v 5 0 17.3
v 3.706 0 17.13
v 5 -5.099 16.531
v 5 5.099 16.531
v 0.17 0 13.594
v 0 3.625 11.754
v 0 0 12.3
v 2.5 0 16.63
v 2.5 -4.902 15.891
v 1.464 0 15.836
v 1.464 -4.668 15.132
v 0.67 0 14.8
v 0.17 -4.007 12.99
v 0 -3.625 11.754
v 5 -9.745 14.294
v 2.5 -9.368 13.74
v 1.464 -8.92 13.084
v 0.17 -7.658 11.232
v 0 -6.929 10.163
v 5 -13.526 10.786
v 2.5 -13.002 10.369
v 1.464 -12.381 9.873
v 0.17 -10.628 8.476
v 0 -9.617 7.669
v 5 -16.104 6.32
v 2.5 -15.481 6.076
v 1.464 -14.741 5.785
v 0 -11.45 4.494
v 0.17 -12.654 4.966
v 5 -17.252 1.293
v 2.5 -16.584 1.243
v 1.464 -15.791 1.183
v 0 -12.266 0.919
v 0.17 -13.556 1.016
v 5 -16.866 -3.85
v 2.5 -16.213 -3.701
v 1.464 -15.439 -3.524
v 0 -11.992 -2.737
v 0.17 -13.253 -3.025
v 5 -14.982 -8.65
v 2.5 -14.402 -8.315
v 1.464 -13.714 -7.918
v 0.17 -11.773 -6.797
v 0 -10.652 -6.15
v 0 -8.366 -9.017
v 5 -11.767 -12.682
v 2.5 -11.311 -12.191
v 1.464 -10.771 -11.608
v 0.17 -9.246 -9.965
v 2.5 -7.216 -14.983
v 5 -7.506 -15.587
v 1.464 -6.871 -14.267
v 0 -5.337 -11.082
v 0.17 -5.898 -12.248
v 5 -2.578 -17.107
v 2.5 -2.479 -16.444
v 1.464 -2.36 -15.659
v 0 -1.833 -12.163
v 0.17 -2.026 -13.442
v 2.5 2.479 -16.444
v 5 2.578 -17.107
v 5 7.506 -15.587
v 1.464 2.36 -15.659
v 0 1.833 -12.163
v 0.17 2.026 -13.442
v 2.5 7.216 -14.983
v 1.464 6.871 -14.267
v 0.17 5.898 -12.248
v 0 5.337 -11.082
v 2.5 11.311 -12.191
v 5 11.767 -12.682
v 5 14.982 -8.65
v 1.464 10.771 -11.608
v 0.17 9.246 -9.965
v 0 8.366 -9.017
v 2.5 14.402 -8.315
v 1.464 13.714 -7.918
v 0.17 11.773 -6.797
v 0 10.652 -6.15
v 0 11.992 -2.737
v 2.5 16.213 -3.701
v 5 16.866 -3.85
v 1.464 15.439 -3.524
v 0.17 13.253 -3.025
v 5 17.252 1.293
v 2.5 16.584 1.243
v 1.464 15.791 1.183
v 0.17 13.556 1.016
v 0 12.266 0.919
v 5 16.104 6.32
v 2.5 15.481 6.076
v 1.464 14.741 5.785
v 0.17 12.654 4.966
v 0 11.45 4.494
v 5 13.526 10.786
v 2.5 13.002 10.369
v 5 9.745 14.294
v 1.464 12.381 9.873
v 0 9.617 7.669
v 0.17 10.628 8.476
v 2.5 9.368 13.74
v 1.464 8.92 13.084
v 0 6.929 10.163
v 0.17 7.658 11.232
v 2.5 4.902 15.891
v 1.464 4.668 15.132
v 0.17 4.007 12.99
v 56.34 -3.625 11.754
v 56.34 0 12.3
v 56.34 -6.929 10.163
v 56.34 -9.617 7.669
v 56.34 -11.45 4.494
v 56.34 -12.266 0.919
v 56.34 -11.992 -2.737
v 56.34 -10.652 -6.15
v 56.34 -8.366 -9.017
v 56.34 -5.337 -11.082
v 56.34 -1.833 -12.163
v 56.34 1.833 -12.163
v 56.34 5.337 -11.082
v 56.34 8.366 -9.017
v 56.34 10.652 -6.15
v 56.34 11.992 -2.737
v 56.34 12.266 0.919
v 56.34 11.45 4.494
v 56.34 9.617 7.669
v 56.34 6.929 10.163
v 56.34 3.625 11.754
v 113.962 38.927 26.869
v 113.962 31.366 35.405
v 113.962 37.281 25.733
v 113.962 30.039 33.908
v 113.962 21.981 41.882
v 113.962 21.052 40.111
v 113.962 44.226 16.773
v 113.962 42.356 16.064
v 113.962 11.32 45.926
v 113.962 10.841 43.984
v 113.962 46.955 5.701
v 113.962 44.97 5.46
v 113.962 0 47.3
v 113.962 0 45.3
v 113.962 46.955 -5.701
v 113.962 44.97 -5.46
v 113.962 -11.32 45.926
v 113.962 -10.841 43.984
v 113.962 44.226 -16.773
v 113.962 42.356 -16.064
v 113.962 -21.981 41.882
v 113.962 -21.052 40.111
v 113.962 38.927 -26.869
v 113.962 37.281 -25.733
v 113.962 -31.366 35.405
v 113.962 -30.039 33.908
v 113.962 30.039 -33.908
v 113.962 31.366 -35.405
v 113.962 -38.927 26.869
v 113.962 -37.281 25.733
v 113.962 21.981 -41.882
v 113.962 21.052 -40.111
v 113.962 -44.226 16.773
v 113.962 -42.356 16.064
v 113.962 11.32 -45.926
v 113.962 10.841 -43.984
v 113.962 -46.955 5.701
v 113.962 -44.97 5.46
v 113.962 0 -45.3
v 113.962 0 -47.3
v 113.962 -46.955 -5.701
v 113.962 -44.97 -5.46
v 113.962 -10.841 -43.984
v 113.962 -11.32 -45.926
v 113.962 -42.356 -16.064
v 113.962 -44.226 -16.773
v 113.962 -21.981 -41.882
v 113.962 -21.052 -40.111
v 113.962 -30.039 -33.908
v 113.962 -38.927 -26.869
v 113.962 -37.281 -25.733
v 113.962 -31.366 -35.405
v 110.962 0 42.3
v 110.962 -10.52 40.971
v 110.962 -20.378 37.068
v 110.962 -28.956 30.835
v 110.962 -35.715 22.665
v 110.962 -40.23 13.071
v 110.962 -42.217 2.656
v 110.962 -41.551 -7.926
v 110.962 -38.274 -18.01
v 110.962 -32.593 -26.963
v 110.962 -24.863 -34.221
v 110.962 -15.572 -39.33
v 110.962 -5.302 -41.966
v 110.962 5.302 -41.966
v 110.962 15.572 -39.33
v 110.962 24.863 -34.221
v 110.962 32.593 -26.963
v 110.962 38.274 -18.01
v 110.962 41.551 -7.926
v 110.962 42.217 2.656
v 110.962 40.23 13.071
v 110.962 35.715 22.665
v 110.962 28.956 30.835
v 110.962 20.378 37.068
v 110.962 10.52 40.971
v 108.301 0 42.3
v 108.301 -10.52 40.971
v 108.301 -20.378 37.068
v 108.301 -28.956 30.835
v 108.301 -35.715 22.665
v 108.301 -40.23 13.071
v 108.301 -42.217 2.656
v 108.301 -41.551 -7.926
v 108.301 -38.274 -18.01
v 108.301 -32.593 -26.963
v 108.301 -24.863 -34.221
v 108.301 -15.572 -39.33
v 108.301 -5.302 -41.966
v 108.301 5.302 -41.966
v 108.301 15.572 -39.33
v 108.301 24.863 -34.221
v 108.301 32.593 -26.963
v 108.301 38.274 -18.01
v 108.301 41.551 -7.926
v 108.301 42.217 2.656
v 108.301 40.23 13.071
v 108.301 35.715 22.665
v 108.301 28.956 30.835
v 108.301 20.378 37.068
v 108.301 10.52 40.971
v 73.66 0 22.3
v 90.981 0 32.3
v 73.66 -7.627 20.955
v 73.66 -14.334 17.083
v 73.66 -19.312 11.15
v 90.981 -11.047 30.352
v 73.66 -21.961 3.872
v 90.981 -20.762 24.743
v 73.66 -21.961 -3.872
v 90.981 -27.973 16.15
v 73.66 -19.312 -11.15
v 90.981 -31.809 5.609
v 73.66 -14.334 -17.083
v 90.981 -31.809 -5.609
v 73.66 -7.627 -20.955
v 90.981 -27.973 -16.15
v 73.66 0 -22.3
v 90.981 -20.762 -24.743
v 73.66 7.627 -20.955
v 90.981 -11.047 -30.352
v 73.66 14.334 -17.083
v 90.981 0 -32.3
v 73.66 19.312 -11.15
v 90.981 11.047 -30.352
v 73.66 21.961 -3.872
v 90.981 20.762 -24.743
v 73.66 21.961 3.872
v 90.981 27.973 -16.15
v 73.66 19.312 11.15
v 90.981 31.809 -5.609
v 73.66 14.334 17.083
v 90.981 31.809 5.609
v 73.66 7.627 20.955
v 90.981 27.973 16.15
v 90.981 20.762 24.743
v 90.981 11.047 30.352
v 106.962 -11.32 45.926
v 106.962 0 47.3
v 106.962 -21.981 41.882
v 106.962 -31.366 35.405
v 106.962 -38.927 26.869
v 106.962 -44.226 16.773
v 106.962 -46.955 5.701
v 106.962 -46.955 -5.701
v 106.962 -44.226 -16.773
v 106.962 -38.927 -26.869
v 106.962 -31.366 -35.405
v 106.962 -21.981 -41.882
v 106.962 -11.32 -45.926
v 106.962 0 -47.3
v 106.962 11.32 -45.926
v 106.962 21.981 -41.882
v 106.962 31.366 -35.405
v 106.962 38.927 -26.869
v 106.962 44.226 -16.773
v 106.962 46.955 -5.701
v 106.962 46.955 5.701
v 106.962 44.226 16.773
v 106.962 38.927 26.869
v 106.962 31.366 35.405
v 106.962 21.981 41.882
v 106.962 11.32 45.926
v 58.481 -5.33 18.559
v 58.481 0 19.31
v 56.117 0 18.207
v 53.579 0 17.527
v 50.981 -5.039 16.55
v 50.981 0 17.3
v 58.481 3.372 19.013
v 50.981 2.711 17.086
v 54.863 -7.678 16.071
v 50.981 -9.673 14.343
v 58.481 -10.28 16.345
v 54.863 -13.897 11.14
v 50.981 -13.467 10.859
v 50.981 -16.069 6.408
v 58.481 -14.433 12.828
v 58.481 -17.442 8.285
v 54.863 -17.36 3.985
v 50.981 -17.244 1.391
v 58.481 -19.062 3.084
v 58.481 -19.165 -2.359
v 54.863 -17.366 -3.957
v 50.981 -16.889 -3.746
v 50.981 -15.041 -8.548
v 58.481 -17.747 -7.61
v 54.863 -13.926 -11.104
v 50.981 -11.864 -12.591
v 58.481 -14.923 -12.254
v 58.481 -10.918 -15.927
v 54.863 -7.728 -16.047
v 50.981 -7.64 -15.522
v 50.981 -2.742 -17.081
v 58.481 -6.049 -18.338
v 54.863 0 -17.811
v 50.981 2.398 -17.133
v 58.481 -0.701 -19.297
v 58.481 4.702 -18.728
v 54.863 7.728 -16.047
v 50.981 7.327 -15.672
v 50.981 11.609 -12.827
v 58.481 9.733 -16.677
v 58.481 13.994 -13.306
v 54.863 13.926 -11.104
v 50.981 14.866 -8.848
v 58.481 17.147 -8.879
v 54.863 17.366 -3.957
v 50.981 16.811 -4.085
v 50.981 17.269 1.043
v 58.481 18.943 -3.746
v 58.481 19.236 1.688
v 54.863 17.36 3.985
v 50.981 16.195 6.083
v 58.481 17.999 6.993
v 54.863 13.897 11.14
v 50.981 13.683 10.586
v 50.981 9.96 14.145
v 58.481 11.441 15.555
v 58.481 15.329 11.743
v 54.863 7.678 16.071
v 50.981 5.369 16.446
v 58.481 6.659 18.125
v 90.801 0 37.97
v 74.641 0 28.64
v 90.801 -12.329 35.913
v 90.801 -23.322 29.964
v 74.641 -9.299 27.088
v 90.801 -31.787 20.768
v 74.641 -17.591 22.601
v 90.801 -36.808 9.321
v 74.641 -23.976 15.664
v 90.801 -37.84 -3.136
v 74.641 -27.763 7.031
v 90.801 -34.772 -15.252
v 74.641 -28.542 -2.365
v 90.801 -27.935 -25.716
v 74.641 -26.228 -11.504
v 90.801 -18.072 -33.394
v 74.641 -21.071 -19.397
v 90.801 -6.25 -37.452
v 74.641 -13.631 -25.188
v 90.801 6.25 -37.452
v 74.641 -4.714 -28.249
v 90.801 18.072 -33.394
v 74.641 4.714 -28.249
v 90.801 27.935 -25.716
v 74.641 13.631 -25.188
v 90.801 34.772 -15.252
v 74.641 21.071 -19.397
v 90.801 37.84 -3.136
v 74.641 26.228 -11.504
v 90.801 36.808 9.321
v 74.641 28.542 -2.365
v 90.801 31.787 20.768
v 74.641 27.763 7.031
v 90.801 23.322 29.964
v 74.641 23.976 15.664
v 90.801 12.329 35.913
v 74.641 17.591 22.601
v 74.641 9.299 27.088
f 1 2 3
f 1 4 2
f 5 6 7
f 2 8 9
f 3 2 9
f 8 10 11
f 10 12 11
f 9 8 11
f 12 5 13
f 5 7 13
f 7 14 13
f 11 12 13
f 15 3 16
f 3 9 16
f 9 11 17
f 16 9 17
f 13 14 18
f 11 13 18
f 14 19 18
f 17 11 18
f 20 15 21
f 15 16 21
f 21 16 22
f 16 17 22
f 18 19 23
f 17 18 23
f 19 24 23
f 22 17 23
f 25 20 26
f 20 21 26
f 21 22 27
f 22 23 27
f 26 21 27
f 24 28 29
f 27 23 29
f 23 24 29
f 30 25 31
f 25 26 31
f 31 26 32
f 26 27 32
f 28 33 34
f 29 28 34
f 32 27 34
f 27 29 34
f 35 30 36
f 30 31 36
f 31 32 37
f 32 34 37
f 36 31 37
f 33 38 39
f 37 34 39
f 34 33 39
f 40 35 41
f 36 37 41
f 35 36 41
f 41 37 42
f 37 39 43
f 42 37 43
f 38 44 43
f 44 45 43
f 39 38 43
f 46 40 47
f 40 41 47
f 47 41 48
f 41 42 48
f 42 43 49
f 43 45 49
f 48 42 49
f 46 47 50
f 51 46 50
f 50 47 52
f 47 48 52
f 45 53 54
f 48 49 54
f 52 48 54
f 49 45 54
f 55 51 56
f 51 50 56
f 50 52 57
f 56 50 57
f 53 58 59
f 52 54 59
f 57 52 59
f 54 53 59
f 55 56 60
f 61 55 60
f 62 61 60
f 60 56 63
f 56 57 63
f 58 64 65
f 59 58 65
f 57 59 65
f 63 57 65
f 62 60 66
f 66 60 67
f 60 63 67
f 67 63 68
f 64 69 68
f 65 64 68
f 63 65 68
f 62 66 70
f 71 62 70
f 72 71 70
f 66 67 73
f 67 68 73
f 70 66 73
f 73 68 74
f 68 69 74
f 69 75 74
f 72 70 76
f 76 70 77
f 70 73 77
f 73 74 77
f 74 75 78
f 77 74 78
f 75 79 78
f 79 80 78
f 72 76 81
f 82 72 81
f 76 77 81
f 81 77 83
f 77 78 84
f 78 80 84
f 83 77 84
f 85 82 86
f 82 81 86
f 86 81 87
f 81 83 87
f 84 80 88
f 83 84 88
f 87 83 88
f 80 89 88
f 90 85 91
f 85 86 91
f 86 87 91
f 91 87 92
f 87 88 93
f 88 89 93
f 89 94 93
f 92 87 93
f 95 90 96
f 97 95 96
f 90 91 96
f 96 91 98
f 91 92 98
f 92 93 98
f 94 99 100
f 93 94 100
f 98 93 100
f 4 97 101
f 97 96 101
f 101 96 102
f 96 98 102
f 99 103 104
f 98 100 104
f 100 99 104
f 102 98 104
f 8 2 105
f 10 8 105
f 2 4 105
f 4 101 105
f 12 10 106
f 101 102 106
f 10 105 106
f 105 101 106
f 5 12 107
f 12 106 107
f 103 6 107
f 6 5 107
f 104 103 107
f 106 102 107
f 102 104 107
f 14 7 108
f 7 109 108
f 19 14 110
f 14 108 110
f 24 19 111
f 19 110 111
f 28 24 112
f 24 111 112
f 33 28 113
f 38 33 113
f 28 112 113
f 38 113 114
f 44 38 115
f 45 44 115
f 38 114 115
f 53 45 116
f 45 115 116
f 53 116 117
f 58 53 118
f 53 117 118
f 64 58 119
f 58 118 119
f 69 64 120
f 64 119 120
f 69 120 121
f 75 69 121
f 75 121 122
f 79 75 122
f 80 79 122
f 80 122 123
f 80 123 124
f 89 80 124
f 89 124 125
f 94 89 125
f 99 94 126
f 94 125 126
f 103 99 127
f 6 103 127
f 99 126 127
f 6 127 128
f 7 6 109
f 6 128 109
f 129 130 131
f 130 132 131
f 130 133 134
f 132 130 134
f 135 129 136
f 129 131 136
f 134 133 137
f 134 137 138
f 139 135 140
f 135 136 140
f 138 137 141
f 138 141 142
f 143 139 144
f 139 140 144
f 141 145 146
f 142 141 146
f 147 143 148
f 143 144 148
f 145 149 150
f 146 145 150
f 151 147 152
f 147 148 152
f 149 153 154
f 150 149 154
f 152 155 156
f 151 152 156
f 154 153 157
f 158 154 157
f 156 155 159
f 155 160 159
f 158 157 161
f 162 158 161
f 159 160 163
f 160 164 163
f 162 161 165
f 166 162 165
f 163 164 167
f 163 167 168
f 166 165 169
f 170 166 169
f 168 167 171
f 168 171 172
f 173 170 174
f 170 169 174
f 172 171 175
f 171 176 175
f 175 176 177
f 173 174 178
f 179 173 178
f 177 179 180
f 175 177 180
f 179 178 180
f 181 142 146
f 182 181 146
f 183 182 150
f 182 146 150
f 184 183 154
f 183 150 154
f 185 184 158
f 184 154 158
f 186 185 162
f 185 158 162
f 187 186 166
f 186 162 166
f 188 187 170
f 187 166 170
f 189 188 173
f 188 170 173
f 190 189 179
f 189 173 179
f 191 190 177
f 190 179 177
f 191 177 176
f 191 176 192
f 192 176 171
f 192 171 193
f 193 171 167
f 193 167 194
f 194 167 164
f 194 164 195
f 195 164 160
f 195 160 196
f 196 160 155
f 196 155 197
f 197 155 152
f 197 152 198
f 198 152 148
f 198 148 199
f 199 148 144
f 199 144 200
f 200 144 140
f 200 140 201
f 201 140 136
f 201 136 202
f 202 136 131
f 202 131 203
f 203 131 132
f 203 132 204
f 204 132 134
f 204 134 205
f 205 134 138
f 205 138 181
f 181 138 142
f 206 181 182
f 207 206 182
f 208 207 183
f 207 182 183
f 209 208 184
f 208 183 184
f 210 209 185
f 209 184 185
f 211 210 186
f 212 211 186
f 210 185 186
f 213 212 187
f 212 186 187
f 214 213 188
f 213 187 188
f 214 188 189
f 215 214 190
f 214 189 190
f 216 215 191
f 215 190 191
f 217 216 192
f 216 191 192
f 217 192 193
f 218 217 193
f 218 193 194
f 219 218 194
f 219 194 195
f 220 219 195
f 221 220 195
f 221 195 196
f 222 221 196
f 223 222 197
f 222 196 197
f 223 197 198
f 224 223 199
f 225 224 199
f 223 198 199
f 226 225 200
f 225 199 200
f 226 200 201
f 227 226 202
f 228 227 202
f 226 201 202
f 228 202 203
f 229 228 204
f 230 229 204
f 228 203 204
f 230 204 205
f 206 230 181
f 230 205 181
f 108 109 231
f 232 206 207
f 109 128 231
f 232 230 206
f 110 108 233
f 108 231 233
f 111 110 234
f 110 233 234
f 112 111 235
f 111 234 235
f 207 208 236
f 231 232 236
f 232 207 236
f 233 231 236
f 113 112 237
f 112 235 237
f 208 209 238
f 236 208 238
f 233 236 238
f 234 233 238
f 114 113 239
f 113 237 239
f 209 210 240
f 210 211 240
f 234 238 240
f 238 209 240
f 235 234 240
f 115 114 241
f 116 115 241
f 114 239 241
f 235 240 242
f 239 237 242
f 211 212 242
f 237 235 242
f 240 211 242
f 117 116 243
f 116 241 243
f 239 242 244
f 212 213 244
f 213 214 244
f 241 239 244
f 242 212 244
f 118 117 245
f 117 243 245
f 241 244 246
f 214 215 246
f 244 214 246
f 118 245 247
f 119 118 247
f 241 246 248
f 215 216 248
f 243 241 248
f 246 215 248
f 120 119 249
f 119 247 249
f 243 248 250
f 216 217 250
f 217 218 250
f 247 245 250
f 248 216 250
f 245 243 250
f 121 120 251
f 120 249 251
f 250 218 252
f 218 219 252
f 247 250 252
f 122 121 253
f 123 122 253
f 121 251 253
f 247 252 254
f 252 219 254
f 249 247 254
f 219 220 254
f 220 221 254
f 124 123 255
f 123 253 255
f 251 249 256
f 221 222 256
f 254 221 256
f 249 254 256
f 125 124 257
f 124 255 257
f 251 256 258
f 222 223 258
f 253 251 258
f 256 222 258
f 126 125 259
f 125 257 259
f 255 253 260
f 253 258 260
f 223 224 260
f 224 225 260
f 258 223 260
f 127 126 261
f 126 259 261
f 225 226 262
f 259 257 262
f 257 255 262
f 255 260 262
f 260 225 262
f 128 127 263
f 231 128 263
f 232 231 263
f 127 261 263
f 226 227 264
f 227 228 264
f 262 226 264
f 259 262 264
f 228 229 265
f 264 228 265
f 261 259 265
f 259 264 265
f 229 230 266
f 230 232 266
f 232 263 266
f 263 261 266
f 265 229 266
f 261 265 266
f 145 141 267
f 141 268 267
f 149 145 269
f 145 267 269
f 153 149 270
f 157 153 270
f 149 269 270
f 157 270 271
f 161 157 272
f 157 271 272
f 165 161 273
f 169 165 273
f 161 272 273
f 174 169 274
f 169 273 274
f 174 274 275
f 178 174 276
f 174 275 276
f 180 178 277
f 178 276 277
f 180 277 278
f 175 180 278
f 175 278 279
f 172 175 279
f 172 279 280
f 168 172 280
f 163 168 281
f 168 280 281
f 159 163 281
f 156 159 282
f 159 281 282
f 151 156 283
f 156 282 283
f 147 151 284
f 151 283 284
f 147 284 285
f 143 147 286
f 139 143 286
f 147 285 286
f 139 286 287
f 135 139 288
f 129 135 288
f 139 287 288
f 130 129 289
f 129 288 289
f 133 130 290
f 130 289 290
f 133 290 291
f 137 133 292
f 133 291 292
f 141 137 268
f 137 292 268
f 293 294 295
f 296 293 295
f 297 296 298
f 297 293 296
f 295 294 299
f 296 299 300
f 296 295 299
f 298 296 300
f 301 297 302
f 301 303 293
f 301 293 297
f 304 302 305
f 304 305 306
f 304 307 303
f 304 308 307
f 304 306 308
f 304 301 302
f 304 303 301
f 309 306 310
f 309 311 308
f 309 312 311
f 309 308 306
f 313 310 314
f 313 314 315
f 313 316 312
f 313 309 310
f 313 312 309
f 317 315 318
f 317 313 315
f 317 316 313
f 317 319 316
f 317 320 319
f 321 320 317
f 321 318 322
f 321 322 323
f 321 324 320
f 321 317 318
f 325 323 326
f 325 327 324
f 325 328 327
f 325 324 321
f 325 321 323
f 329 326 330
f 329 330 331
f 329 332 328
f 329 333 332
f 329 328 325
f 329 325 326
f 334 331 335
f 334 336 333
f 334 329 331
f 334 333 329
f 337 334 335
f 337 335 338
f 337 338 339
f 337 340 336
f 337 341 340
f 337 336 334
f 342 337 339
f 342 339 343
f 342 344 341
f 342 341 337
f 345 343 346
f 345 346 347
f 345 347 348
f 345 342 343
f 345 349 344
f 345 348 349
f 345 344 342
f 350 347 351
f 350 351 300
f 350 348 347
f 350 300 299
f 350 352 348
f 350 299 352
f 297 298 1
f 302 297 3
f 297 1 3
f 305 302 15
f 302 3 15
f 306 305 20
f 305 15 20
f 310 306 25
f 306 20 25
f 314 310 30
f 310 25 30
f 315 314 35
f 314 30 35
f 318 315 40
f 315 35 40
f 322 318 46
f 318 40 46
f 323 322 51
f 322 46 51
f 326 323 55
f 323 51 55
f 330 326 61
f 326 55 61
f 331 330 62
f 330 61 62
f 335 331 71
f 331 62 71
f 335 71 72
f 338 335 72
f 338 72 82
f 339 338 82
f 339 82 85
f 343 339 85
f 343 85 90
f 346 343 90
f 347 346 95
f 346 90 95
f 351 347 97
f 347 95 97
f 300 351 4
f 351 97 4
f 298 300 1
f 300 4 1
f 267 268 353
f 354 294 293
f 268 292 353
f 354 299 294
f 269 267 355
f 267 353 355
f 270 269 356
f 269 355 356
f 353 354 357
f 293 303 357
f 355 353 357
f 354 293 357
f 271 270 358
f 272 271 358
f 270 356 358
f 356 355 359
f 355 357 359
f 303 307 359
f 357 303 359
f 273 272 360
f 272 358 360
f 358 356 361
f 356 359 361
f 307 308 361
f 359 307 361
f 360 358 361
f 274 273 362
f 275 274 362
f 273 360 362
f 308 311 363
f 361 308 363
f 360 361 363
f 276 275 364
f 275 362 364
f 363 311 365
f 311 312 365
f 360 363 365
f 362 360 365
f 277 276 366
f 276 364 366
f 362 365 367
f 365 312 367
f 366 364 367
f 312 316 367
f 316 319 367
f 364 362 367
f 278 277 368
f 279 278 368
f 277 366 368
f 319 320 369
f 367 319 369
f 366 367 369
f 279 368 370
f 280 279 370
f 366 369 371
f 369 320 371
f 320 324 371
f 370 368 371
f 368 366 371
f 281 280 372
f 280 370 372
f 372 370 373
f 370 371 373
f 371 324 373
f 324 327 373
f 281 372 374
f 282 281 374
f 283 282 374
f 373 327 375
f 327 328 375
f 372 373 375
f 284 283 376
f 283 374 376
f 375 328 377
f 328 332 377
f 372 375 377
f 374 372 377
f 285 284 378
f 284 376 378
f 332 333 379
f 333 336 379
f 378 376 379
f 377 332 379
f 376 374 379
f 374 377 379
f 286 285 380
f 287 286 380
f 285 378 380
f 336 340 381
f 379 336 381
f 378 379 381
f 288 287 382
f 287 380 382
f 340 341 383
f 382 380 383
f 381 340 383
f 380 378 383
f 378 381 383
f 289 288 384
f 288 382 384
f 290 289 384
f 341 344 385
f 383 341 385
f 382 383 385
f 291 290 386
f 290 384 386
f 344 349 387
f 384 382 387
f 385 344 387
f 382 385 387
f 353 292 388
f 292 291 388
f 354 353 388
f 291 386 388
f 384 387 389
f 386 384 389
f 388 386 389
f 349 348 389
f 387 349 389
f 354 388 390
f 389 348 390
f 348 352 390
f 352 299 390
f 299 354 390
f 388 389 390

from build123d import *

# Parameters (mm, degrees)
F2_SIZE = 3
F3_R    = 15
F4_R    = 4.99999


# Not quite as in the source:
# - a fillet or chamfer is up to 0.001 mm smaller than in the source, because OpenCascade refuses the exact size


with BuildPart() as f1:
    # F0 (on Front) → F1 (revolve)
    with BuildSketch(Plane.XZ):
        Polygon((55, 17.3), (0, 17.3), (0, 12.3), (56.3397459622, 12.3), (108.3012701892, 42.3), (113.9615242271, 42.3), (113.9615242271, 47.3), (106.9615242271, 47.3), align=None)
    revolve(axis=Axis((19.2044641059, 0, 0), (1, 0, 0)))

    # F2
    f2_edges = [f1.edges().sort_by_distance(p)[0] for p in [
        (113.961524, 0, -42.3),
    ]]
    chamfer(f2_edges, length=F2_SIZE)

    # F3
    f3_edges = [f1.edges().sort_by_distance(p)[0] for p in [
        (55, 0, -17.3),
    ]]
    fillet(f3_edges, radius=F3_R)

    # F4 (radius 5 in the source; OpenCascade refuses exactly that, so slightly less here)
    f4_edges = [f1.edges().sort_by_distance(p)[0] for p in [
        (0, 0, -17.3),
    ]]
    fillet(f4_edges, radius=F4_R)


solid = f1.part
